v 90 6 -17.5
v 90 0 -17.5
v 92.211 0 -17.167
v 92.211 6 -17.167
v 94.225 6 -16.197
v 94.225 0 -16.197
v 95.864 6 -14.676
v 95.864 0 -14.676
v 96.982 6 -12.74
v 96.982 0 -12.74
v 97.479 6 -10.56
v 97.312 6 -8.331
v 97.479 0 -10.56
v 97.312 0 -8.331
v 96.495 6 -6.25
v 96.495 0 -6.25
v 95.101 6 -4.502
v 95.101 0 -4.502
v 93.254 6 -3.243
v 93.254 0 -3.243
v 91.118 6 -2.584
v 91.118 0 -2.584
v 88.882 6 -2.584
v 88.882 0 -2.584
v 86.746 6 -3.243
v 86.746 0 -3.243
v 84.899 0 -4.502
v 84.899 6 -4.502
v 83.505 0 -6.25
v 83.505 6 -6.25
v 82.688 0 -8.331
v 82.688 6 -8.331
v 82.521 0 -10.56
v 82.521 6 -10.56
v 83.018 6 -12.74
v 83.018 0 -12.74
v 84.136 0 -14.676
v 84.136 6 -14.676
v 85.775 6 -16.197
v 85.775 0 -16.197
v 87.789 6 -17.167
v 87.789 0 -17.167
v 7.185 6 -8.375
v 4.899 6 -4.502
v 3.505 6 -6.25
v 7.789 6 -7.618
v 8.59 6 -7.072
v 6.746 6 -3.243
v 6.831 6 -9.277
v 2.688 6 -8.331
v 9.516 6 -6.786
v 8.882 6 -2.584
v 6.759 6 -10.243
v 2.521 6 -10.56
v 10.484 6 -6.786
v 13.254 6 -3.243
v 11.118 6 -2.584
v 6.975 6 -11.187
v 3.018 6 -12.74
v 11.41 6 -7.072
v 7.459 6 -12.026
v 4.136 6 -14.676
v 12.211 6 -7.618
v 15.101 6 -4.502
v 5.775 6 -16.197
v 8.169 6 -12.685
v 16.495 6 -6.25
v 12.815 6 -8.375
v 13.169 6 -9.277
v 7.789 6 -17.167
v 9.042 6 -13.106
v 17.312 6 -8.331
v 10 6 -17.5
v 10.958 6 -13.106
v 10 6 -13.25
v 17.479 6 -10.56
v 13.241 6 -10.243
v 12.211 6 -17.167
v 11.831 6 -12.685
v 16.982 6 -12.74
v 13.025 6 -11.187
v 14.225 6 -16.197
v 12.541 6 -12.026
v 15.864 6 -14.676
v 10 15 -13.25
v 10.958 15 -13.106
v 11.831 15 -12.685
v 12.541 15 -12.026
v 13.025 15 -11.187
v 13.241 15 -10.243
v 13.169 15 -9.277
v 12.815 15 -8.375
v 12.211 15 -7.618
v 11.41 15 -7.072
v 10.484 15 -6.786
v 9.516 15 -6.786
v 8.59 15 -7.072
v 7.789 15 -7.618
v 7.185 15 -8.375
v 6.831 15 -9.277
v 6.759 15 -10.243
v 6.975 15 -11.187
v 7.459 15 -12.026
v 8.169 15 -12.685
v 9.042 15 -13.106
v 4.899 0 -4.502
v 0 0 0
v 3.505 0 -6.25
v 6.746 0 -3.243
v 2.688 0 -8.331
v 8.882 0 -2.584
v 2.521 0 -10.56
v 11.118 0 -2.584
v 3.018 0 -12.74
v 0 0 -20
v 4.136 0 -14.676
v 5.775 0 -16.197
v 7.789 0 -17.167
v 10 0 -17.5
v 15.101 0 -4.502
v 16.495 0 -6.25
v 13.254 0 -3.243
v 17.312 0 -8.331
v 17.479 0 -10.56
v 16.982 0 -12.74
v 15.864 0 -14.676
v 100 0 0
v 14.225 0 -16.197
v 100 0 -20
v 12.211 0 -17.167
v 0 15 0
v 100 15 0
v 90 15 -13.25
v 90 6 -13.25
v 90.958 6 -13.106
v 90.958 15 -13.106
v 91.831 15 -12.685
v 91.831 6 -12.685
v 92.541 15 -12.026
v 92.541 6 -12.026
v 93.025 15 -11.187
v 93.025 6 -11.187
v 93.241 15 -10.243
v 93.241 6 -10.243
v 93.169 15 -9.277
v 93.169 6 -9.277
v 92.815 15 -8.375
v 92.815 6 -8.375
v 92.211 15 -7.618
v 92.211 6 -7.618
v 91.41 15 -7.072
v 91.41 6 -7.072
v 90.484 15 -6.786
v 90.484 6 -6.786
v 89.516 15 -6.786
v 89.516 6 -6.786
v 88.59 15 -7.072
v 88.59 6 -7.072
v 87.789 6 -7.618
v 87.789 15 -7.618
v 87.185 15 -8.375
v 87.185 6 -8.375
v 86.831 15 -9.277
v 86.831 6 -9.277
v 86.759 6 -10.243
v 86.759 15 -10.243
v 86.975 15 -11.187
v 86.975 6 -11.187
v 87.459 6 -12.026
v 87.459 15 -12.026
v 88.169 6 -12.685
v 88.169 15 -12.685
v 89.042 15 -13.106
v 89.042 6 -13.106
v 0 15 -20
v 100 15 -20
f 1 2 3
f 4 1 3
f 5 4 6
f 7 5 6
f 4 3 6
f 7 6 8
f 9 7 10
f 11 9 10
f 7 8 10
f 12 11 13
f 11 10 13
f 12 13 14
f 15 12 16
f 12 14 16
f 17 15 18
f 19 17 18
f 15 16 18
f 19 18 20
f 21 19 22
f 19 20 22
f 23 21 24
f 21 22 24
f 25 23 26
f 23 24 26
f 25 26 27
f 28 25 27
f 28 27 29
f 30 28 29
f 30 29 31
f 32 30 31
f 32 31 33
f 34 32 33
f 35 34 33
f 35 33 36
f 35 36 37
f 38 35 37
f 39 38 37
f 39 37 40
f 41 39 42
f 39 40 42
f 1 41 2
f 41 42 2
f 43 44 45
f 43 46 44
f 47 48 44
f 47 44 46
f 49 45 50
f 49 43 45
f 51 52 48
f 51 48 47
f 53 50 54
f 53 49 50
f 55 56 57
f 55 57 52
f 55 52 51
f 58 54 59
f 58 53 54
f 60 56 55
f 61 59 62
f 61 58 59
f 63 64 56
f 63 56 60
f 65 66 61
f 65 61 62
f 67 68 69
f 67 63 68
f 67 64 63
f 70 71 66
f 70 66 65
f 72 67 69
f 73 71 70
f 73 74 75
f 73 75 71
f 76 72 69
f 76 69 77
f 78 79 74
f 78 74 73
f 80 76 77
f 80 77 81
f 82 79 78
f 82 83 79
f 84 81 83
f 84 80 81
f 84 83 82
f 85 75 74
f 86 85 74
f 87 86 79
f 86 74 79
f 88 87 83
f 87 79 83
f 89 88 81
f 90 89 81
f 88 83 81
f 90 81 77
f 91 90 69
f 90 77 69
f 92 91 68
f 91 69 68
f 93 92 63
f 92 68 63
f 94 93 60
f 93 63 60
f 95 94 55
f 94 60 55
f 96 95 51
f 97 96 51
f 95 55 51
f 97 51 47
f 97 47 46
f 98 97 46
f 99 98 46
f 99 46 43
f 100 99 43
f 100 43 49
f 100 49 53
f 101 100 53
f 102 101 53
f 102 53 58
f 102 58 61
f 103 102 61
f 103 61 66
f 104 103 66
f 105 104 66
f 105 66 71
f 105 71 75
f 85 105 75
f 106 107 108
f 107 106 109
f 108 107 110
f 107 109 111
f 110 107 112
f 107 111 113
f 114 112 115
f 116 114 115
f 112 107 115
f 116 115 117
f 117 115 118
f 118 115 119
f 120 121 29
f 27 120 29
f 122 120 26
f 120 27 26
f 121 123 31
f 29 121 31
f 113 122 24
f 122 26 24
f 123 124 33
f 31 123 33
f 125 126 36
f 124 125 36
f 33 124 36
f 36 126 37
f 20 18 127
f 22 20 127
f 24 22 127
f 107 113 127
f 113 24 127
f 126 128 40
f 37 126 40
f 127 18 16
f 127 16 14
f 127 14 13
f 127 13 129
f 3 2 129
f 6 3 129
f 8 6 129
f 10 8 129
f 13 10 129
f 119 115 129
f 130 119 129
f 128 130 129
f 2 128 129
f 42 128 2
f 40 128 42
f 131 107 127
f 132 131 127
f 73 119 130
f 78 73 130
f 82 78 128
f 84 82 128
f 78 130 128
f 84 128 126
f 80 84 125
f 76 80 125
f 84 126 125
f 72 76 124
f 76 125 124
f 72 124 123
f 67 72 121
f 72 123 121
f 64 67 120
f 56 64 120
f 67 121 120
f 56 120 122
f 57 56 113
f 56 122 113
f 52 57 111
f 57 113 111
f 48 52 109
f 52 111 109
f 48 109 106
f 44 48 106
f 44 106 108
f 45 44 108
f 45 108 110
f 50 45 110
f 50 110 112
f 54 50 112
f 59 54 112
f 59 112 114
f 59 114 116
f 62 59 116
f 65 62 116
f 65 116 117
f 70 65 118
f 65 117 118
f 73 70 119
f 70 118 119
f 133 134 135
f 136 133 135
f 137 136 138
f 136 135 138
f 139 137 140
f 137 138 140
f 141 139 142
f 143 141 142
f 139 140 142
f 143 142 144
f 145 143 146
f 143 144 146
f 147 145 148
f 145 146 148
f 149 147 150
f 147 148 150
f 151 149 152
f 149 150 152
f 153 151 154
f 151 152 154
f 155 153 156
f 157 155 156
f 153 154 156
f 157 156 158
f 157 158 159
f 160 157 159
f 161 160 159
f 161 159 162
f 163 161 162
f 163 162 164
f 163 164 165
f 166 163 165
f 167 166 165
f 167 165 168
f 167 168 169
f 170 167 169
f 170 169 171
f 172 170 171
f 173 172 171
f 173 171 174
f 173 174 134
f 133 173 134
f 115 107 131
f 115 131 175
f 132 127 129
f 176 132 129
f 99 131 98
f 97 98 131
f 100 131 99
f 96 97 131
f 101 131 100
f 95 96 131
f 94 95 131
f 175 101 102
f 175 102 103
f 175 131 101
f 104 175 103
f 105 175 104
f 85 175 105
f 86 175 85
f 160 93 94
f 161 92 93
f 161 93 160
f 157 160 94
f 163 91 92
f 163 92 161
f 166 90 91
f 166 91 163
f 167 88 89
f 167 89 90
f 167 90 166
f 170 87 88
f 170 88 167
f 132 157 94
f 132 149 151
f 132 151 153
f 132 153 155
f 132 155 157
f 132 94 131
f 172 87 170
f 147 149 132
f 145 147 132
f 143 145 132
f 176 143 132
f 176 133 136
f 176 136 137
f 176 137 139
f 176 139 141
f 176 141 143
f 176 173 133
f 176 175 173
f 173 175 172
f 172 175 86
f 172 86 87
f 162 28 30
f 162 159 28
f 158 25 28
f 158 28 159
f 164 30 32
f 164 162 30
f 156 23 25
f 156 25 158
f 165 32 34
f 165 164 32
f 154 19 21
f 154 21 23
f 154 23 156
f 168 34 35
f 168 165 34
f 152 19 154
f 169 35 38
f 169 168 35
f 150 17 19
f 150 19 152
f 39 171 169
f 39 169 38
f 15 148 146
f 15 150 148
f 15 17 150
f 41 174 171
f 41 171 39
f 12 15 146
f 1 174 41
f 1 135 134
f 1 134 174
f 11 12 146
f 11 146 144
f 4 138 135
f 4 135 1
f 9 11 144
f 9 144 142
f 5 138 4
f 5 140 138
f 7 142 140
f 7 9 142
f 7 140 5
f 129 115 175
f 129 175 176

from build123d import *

# Parameters (mm, degrees)
SKETCH1_W           = 100
SKETCH1_H           = 20
BOSS_EXTRUDE1_DEPTH = 15
SKETCH2_R           = 7.5
CUT_EXTRUDE1_DEPTH  = 6
SKETCH3_R           = 3.25
CUT_EXTRUDE2_DEPTH  = 103.376755174


with BuildPart() as part:
    # Sketch1 → Boss-Extrude1 (new body)
    with BuildSketch(Plane(origin=(0, 0, 0), x_dir=(1, 0, 0), z_dir=(0, 1, 0))):
        with Locations((50, 10)):
            Rectangle(SKETCH1_W, SKETCH1_H)
    extrude(amount=BOSS_EXTRUDE1_DEPTH)

    # Sketch2 → Cut-Extrude1 (cut)
    with BuildSketch(Plane.XZ):
        with Locations(Location((10, -10, 0), (0, 0, 270))):
            Circle(SKETCH2_R)
        with Locations(Location((90, -10, 0), (0, 0, 270))):
            Circle(SKETCH2_R)
    extrude(amount=-CUT_EXTRUDE1_DEPTH, mode=Mode.SUBTRACT)

    # Sketch3 → Cut-Extrude2 (cut, through all)
    with BuildSketch(Plane.XZ.offset(-6)):
        with Locations(Location((10, -10, 0), (0, 0, 270))):
            Circle(SKETCH3_R)
        with Locations(Location((90, -10, 0), (0, 0, 270))):
            Circle(SKETCH3_R)
    extrude(amount=-CUT_EXTRUDE2_DEPTH, mode=Mode.SUBTRACT)


solid = part.part
